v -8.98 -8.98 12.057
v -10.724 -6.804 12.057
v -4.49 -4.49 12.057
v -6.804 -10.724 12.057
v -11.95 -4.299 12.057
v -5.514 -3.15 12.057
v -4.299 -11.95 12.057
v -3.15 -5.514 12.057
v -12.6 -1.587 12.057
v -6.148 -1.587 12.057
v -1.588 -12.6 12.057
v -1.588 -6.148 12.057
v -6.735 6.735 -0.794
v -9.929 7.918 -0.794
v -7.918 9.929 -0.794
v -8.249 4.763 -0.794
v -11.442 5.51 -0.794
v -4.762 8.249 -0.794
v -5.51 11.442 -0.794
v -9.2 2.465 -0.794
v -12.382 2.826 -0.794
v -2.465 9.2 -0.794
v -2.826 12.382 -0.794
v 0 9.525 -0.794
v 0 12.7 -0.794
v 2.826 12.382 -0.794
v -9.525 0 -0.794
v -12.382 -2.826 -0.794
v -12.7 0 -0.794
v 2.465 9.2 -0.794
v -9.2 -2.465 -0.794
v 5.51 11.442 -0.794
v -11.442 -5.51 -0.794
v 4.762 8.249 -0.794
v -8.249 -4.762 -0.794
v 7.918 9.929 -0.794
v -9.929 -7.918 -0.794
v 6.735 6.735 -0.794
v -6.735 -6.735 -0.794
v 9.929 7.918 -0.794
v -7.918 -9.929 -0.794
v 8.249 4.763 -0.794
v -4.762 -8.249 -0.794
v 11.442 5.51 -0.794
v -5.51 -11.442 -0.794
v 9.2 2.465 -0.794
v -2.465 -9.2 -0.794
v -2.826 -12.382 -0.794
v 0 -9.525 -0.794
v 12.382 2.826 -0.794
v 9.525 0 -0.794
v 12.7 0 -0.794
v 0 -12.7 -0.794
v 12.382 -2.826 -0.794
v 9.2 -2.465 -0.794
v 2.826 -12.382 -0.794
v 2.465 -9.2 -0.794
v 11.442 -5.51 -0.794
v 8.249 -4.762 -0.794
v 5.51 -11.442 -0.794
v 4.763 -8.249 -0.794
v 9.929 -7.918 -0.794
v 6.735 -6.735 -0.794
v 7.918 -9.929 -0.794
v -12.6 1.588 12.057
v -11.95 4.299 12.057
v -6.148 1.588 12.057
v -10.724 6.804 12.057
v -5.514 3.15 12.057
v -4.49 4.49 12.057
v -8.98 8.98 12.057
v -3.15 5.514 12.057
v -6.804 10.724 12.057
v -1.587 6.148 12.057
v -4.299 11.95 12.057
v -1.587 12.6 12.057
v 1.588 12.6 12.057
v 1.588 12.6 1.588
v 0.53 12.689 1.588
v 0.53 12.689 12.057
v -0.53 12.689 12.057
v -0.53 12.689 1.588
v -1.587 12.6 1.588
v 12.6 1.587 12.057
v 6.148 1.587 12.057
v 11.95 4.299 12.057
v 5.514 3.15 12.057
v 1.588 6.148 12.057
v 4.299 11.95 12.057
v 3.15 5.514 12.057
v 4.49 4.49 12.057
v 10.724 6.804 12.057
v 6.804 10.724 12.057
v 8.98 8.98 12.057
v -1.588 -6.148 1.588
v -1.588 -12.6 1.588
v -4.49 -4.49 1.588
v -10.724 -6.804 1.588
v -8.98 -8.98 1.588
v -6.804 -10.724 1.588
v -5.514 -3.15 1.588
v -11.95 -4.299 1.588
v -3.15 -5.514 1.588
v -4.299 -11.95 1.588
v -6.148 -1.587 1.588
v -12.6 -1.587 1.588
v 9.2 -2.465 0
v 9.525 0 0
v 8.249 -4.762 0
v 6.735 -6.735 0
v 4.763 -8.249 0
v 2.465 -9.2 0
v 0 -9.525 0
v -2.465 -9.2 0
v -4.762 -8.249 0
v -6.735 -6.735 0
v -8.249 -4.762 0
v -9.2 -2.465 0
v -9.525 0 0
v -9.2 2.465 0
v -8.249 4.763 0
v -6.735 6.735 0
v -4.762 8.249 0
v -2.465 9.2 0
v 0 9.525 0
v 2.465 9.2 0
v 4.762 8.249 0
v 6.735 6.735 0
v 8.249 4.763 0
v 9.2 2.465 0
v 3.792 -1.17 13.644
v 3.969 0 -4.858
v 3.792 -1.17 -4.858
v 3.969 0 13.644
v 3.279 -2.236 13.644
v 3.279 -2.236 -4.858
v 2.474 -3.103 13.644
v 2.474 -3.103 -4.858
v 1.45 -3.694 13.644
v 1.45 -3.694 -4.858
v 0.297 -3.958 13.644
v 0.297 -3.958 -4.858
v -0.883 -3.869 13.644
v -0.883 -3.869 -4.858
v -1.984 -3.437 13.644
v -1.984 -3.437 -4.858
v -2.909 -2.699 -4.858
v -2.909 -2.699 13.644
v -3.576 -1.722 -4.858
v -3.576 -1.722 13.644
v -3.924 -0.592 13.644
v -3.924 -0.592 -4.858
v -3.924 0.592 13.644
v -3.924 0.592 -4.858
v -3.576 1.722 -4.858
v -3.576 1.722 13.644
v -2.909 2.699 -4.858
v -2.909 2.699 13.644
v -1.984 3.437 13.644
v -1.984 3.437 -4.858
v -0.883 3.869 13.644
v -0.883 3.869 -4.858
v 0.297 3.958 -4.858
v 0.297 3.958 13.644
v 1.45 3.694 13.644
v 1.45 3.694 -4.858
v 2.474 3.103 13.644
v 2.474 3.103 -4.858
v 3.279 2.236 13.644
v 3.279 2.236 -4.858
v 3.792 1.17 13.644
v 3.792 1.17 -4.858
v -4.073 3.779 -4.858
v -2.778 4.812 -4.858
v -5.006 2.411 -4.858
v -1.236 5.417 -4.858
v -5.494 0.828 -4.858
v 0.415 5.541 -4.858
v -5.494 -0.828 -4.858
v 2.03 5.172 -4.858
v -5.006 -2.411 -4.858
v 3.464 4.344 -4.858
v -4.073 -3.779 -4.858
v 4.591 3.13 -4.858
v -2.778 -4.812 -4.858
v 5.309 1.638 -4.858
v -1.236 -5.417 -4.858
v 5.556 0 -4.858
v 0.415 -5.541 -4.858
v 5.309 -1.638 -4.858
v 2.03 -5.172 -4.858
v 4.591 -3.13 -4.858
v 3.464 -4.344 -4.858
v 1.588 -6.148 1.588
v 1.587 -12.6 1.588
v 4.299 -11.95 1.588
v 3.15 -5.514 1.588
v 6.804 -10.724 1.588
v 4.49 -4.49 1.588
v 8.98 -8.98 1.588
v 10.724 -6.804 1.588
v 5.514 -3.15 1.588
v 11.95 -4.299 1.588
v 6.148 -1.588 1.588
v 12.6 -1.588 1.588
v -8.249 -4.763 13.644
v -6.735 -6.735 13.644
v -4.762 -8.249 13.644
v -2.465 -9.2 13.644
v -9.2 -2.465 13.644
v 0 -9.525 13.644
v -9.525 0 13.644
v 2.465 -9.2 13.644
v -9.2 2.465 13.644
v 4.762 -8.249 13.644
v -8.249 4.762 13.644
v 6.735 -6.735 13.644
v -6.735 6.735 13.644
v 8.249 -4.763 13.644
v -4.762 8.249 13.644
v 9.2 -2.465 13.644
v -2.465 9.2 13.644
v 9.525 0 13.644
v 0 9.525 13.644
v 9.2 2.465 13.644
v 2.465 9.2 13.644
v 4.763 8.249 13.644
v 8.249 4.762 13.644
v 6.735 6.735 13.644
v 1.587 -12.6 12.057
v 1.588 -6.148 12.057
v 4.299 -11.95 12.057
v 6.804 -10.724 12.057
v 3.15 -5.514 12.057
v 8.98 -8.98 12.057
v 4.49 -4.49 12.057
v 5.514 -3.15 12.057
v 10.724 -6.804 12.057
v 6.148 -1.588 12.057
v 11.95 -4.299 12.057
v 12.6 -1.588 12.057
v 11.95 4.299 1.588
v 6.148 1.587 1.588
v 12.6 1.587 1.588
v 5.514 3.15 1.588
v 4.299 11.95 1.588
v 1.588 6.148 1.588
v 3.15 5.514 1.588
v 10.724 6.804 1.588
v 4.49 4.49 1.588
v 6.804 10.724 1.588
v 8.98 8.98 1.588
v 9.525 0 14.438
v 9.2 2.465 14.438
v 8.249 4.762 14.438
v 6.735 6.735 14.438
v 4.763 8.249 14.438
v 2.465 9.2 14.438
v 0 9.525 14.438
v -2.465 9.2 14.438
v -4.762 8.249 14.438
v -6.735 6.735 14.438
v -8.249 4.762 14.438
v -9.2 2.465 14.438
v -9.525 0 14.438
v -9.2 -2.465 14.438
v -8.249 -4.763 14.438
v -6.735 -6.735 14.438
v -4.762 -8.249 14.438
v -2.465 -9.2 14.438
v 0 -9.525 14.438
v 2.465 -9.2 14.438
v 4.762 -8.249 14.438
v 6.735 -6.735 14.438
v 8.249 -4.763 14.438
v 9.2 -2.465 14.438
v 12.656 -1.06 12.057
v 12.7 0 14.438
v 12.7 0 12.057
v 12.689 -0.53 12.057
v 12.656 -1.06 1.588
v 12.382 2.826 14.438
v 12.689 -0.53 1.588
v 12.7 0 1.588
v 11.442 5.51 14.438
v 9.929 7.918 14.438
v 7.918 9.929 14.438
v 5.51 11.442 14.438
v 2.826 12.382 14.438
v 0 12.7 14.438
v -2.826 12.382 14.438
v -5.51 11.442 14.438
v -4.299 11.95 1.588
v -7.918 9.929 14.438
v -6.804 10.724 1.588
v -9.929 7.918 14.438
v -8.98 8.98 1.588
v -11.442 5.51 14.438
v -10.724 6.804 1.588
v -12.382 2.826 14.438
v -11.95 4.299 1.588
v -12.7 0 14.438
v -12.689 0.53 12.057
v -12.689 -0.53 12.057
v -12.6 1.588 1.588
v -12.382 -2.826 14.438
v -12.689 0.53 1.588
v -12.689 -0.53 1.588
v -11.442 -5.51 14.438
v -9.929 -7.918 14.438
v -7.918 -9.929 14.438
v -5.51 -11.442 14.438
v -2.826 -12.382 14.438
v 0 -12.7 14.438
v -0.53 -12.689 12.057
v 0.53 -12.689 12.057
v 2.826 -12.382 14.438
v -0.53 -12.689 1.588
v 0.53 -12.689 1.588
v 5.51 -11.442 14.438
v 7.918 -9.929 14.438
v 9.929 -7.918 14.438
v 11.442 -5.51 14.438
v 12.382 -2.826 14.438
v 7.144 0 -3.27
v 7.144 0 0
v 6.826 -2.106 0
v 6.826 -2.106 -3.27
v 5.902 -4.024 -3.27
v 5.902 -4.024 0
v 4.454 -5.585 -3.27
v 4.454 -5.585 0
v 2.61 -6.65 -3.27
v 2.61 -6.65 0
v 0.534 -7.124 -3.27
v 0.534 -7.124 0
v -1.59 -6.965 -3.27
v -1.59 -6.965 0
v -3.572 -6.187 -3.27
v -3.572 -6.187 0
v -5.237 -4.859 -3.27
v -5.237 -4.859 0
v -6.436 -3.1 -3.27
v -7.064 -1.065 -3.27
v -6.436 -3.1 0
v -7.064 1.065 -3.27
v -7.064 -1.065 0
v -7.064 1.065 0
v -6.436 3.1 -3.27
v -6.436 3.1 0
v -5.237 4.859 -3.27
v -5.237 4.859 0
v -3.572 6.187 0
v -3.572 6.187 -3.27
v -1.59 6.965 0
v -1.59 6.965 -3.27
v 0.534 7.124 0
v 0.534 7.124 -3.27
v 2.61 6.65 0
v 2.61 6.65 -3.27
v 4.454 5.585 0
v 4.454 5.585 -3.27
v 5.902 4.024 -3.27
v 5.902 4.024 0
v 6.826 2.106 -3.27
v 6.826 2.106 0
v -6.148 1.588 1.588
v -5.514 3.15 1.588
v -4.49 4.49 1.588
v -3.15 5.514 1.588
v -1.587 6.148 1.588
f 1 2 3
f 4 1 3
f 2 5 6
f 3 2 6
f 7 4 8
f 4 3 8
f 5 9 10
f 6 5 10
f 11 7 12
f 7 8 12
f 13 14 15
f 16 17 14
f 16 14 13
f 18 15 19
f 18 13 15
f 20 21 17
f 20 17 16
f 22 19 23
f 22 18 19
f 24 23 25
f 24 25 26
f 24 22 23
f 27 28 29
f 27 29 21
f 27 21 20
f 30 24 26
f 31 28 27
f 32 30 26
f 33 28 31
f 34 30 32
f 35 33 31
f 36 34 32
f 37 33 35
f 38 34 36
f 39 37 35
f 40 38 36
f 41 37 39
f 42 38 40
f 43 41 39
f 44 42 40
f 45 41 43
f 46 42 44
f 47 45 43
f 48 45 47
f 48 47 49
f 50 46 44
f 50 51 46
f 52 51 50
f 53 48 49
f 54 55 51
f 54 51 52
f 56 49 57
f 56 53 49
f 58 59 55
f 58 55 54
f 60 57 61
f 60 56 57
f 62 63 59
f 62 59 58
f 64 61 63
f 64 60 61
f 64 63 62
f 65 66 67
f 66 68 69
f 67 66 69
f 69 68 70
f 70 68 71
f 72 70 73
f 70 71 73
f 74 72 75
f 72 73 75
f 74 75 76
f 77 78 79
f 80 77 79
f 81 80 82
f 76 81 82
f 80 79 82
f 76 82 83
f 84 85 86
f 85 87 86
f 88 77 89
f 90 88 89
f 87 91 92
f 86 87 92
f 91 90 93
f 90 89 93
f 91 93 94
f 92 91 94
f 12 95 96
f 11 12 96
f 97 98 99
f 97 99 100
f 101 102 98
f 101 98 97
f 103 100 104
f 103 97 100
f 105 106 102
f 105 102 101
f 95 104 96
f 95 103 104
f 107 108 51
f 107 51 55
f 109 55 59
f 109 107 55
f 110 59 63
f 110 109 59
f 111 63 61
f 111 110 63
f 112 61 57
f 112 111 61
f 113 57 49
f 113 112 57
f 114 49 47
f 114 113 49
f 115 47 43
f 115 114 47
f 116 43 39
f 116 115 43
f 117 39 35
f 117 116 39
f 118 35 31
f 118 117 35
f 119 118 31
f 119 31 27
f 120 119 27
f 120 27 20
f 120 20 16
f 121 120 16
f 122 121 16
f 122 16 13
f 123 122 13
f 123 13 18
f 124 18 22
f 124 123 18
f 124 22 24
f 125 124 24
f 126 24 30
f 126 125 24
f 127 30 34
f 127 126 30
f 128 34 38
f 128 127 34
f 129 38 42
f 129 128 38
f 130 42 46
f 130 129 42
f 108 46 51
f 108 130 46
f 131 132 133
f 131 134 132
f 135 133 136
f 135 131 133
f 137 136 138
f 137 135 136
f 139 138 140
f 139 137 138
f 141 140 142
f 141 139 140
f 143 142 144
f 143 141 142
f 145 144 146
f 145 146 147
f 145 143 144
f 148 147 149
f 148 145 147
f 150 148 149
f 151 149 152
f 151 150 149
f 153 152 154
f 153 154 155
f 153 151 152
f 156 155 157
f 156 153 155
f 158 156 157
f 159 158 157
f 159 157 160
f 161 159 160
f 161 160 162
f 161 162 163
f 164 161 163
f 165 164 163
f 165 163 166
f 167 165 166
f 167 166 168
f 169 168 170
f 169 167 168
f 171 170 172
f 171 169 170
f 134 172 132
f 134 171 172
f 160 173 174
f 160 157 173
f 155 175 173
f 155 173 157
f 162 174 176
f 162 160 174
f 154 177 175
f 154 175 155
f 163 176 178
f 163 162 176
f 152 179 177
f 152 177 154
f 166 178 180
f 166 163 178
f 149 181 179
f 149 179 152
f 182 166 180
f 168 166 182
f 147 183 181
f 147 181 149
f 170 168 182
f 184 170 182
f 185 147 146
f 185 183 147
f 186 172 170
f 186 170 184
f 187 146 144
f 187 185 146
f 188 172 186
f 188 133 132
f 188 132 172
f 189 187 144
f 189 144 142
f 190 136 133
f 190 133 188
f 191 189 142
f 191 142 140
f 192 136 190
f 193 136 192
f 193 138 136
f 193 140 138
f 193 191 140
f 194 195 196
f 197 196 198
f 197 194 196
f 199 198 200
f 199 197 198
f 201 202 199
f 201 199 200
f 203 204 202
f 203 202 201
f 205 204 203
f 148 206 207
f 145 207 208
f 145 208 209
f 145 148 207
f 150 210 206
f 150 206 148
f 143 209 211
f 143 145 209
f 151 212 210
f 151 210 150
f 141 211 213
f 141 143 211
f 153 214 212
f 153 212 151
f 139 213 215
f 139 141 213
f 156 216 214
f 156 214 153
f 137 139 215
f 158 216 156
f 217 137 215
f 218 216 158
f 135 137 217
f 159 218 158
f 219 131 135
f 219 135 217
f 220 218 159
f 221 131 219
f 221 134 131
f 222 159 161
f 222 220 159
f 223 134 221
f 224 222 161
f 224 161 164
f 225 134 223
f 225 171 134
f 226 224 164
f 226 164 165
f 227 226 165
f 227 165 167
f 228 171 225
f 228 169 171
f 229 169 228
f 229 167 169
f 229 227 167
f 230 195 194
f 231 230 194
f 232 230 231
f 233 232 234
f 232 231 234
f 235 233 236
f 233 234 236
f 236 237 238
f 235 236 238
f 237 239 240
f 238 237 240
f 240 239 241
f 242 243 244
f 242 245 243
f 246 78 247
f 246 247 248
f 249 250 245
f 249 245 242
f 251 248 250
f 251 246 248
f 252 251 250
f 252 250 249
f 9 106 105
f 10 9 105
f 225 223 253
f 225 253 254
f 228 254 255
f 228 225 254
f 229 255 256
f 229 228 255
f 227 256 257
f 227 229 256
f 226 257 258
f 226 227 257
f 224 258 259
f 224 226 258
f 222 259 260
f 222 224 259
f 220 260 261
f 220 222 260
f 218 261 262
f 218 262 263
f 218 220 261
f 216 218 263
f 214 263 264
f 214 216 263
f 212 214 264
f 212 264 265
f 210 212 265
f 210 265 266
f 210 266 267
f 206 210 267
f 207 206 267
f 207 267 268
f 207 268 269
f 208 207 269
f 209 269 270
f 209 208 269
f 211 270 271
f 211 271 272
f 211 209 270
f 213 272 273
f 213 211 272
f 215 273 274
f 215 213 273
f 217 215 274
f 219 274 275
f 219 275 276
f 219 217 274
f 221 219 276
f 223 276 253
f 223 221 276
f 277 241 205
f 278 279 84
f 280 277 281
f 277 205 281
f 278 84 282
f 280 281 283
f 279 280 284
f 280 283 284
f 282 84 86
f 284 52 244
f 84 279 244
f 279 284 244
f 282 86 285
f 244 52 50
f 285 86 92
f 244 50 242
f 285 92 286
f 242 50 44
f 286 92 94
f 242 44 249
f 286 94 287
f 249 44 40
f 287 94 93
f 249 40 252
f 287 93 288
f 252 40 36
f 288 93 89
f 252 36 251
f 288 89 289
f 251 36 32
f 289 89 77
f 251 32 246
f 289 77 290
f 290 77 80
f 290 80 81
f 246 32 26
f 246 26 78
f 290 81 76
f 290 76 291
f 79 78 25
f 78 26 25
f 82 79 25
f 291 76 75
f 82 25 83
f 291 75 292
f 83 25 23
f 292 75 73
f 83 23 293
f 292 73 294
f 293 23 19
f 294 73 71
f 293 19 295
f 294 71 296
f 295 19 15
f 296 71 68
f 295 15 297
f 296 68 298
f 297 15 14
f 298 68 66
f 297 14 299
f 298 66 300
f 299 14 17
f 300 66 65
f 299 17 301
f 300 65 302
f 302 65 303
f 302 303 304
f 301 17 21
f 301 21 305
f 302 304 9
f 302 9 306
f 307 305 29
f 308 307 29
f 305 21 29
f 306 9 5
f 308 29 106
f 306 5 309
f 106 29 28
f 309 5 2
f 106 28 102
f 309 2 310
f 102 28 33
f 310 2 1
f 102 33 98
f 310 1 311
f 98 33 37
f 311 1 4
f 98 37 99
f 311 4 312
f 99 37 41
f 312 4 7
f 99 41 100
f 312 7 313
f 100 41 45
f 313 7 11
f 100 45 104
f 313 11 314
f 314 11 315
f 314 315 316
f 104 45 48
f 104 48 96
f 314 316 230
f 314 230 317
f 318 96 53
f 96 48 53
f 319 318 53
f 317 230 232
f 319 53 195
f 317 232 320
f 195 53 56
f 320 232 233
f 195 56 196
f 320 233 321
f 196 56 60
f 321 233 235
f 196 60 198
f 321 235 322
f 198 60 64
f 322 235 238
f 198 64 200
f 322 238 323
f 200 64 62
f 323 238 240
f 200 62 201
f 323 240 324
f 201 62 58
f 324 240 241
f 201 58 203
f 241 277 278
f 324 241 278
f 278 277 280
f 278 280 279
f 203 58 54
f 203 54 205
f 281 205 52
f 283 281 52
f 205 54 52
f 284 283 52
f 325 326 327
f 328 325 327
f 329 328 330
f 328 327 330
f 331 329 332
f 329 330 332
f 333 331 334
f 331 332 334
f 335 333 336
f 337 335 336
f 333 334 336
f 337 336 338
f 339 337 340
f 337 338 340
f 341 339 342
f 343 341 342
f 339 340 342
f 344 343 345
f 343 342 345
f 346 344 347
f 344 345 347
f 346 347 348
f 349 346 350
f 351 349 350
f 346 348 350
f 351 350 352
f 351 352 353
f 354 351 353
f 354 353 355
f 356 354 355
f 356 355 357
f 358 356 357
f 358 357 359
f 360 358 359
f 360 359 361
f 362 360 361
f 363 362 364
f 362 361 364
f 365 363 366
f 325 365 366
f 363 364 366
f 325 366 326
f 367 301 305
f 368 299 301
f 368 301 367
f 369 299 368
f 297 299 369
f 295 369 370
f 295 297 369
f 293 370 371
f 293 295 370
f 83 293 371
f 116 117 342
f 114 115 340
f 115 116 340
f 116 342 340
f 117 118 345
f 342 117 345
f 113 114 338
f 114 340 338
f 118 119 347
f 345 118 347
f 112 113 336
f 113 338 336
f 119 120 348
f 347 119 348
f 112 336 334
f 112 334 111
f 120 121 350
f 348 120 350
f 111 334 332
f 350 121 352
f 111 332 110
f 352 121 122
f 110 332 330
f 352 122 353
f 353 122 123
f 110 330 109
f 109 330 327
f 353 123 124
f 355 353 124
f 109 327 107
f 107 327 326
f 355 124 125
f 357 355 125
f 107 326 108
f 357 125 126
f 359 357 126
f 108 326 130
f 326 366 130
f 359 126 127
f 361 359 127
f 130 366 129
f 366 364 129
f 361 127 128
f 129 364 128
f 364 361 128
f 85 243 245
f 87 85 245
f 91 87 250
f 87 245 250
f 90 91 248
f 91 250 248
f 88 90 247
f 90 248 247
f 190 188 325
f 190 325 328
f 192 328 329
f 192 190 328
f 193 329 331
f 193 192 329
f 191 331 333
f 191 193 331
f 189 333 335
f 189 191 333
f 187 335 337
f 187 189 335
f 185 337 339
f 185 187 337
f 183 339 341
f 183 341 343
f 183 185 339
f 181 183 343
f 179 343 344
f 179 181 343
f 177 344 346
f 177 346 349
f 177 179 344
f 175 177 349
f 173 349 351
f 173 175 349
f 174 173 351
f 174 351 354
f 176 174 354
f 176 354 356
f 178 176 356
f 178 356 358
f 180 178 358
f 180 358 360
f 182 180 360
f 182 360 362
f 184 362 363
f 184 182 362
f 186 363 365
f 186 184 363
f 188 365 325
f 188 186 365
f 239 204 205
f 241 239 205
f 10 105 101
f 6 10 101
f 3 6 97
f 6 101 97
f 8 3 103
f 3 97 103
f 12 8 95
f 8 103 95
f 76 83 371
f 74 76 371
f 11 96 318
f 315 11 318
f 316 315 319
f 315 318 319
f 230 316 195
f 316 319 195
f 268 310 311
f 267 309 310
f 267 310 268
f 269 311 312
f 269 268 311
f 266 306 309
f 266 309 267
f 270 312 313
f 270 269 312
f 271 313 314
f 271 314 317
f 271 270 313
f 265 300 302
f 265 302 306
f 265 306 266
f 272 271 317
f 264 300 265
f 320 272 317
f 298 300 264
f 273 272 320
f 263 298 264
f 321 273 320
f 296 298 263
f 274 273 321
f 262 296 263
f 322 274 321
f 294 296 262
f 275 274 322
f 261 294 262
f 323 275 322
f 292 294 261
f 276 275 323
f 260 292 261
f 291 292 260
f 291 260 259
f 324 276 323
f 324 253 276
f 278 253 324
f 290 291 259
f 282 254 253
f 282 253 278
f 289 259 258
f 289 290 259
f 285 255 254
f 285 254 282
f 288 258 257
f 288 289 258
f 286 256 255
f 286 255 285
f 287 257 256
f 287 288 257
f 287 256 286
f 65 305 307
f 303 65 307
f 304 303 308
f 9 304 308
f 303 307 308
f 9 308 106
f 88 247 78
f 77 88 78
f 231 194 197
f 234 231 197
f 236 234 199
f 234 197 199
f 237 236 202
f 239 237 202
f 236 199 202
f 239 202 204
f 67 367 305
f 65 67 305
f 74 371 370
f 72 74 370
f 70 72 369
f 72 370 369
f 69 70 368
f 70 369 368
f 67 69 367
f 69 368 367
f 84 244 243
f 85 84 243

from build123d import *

# Parameters (mm, degrees)
F0_R             = 12.7
F0_R_2           = 3.96875
F1_DEPTH         = 1.5875
F2_R             = 12.7
F2_R_2           = 9.525
F3_DEPTH         = 0.79375
F4_R             = 6.35
F4_R_2           = 3.96875
F5_DEPTH         = 10.4694736
F6_R             = 12.7
F6_R_2           = 3.96875
F7_DEPTH         = 1.5875
F8_R             = 12.7
F8_R_2           = 9.525
F9_DEPTH         = 0.79375
F11_DEPTH        = 10.4694736
F11_COPIES_COUNT = 4
F12_R            = 7.14375
F12_R_2          = 3.96875
F13_DEPTH        = 4.85775
F14_SIZE         = 1.5875


# Not quite as in the source:
# - a length typed as a fraction of an inch, garbled in the dataset ("3 / 203.2 mm" for 3/8 in), is restored
# - a pattern or mirror of a feature is missing from the dataset's text; its kind, count and spacing are read off the source's solid


with BuildPart() as f1:
    # F0 (on Top) → F1 (new body)
    with BuildSketch(Plane.XY):
        Circle(F0_R)
        Circle(F0_R_2, mode=Mode.SUBTRACT)
    extrude(amount=F1_DEPTH)

    # F2 (on face) → F3 (join)
    with BuildSketch(Plane(origin=(0, 0, 0), x_dir=(1, 0, 0), z_dir=(0, 0, -1))):
        Circle(F2_R)
        Circle(F2_R_2, mode=Mode.SUBTRACT)
    extrude(amount=F3_DEPTH)

    # F4 (on face) → F5 (join)
    with BuildSketch(Plane.XY.offset(1.5875)):
        Circle(F4_R)
        Circle(F4_R_2, mode=Mode.SUBTRACT)
    extrude(amount=F5_DEPTH)

    # F6 (on face) → F7 (join)
    with BuildSketch(Plane.XY.offset(12.0569736)):
        Circle(F6_R)
        Circle(F6_R_2, mode=Mode.SUBTRACT)
    extrude(amount=F7_DEPTH)

    # F8 (on face) → F9 (join)
    with BuildSketch(Plane.XY.offset(13.6444736)):
        Circle(F8_R)
        Circle(F8_R_2, mode=Mode.SUBTRACT)
    extrude(amount=F9_DEPTH)

    # F10 (on face) → F11 (join, through all)
    with BuildSketch(Plane.XY.offset(1.5875)):
        with BuildLine():
            Line((1.5875, -12.6003906189), (1.5875, -6.1483610621))
            ThreePointArc((1.5875, -6.1483610621), (0, -6.35), (-1.5875, -6.1483610621))
            Line((-1.5875, -6.1483610621), (-1.5875, -12.6003906189))
            ThreePointArc((-1.5875, -12.6003906189), (0, -12.7), (1.5875, -12.6003906189))
        make_face()
    f11 = extrude(amount=F11_DEPTH)

    # F11_copies: F11 ×4 about axis
    f11_copies_axis = Axis((0, 0, 0), (0, 0, 1))
    for i in range(1, F11_COPIES_COUNT):
        add(f11.rotate(f11_copies_axis, i * 360 / F11_COPIES_COUNT))

    # F12 (on face) → F13 (join)
    with BuildSketch(Plane(origin=(0, 0, 0), x_dir=(1, 0, 0), z_dir=(0, 0, -1))):
        Circle(F12_R)
        Circle(F12_R_2, mode=Mode.SUBTRACT)
    extrude(amount=F13_DEPTH)

    # F14
    f14_edges = [f1.edges().sort_by_distance(p)[0] for p in [
        (-7.14375, 0, -4.85775),
    ]]
    chamfer(f14_edges, length=F14_SIZE)


solid = f1.part
